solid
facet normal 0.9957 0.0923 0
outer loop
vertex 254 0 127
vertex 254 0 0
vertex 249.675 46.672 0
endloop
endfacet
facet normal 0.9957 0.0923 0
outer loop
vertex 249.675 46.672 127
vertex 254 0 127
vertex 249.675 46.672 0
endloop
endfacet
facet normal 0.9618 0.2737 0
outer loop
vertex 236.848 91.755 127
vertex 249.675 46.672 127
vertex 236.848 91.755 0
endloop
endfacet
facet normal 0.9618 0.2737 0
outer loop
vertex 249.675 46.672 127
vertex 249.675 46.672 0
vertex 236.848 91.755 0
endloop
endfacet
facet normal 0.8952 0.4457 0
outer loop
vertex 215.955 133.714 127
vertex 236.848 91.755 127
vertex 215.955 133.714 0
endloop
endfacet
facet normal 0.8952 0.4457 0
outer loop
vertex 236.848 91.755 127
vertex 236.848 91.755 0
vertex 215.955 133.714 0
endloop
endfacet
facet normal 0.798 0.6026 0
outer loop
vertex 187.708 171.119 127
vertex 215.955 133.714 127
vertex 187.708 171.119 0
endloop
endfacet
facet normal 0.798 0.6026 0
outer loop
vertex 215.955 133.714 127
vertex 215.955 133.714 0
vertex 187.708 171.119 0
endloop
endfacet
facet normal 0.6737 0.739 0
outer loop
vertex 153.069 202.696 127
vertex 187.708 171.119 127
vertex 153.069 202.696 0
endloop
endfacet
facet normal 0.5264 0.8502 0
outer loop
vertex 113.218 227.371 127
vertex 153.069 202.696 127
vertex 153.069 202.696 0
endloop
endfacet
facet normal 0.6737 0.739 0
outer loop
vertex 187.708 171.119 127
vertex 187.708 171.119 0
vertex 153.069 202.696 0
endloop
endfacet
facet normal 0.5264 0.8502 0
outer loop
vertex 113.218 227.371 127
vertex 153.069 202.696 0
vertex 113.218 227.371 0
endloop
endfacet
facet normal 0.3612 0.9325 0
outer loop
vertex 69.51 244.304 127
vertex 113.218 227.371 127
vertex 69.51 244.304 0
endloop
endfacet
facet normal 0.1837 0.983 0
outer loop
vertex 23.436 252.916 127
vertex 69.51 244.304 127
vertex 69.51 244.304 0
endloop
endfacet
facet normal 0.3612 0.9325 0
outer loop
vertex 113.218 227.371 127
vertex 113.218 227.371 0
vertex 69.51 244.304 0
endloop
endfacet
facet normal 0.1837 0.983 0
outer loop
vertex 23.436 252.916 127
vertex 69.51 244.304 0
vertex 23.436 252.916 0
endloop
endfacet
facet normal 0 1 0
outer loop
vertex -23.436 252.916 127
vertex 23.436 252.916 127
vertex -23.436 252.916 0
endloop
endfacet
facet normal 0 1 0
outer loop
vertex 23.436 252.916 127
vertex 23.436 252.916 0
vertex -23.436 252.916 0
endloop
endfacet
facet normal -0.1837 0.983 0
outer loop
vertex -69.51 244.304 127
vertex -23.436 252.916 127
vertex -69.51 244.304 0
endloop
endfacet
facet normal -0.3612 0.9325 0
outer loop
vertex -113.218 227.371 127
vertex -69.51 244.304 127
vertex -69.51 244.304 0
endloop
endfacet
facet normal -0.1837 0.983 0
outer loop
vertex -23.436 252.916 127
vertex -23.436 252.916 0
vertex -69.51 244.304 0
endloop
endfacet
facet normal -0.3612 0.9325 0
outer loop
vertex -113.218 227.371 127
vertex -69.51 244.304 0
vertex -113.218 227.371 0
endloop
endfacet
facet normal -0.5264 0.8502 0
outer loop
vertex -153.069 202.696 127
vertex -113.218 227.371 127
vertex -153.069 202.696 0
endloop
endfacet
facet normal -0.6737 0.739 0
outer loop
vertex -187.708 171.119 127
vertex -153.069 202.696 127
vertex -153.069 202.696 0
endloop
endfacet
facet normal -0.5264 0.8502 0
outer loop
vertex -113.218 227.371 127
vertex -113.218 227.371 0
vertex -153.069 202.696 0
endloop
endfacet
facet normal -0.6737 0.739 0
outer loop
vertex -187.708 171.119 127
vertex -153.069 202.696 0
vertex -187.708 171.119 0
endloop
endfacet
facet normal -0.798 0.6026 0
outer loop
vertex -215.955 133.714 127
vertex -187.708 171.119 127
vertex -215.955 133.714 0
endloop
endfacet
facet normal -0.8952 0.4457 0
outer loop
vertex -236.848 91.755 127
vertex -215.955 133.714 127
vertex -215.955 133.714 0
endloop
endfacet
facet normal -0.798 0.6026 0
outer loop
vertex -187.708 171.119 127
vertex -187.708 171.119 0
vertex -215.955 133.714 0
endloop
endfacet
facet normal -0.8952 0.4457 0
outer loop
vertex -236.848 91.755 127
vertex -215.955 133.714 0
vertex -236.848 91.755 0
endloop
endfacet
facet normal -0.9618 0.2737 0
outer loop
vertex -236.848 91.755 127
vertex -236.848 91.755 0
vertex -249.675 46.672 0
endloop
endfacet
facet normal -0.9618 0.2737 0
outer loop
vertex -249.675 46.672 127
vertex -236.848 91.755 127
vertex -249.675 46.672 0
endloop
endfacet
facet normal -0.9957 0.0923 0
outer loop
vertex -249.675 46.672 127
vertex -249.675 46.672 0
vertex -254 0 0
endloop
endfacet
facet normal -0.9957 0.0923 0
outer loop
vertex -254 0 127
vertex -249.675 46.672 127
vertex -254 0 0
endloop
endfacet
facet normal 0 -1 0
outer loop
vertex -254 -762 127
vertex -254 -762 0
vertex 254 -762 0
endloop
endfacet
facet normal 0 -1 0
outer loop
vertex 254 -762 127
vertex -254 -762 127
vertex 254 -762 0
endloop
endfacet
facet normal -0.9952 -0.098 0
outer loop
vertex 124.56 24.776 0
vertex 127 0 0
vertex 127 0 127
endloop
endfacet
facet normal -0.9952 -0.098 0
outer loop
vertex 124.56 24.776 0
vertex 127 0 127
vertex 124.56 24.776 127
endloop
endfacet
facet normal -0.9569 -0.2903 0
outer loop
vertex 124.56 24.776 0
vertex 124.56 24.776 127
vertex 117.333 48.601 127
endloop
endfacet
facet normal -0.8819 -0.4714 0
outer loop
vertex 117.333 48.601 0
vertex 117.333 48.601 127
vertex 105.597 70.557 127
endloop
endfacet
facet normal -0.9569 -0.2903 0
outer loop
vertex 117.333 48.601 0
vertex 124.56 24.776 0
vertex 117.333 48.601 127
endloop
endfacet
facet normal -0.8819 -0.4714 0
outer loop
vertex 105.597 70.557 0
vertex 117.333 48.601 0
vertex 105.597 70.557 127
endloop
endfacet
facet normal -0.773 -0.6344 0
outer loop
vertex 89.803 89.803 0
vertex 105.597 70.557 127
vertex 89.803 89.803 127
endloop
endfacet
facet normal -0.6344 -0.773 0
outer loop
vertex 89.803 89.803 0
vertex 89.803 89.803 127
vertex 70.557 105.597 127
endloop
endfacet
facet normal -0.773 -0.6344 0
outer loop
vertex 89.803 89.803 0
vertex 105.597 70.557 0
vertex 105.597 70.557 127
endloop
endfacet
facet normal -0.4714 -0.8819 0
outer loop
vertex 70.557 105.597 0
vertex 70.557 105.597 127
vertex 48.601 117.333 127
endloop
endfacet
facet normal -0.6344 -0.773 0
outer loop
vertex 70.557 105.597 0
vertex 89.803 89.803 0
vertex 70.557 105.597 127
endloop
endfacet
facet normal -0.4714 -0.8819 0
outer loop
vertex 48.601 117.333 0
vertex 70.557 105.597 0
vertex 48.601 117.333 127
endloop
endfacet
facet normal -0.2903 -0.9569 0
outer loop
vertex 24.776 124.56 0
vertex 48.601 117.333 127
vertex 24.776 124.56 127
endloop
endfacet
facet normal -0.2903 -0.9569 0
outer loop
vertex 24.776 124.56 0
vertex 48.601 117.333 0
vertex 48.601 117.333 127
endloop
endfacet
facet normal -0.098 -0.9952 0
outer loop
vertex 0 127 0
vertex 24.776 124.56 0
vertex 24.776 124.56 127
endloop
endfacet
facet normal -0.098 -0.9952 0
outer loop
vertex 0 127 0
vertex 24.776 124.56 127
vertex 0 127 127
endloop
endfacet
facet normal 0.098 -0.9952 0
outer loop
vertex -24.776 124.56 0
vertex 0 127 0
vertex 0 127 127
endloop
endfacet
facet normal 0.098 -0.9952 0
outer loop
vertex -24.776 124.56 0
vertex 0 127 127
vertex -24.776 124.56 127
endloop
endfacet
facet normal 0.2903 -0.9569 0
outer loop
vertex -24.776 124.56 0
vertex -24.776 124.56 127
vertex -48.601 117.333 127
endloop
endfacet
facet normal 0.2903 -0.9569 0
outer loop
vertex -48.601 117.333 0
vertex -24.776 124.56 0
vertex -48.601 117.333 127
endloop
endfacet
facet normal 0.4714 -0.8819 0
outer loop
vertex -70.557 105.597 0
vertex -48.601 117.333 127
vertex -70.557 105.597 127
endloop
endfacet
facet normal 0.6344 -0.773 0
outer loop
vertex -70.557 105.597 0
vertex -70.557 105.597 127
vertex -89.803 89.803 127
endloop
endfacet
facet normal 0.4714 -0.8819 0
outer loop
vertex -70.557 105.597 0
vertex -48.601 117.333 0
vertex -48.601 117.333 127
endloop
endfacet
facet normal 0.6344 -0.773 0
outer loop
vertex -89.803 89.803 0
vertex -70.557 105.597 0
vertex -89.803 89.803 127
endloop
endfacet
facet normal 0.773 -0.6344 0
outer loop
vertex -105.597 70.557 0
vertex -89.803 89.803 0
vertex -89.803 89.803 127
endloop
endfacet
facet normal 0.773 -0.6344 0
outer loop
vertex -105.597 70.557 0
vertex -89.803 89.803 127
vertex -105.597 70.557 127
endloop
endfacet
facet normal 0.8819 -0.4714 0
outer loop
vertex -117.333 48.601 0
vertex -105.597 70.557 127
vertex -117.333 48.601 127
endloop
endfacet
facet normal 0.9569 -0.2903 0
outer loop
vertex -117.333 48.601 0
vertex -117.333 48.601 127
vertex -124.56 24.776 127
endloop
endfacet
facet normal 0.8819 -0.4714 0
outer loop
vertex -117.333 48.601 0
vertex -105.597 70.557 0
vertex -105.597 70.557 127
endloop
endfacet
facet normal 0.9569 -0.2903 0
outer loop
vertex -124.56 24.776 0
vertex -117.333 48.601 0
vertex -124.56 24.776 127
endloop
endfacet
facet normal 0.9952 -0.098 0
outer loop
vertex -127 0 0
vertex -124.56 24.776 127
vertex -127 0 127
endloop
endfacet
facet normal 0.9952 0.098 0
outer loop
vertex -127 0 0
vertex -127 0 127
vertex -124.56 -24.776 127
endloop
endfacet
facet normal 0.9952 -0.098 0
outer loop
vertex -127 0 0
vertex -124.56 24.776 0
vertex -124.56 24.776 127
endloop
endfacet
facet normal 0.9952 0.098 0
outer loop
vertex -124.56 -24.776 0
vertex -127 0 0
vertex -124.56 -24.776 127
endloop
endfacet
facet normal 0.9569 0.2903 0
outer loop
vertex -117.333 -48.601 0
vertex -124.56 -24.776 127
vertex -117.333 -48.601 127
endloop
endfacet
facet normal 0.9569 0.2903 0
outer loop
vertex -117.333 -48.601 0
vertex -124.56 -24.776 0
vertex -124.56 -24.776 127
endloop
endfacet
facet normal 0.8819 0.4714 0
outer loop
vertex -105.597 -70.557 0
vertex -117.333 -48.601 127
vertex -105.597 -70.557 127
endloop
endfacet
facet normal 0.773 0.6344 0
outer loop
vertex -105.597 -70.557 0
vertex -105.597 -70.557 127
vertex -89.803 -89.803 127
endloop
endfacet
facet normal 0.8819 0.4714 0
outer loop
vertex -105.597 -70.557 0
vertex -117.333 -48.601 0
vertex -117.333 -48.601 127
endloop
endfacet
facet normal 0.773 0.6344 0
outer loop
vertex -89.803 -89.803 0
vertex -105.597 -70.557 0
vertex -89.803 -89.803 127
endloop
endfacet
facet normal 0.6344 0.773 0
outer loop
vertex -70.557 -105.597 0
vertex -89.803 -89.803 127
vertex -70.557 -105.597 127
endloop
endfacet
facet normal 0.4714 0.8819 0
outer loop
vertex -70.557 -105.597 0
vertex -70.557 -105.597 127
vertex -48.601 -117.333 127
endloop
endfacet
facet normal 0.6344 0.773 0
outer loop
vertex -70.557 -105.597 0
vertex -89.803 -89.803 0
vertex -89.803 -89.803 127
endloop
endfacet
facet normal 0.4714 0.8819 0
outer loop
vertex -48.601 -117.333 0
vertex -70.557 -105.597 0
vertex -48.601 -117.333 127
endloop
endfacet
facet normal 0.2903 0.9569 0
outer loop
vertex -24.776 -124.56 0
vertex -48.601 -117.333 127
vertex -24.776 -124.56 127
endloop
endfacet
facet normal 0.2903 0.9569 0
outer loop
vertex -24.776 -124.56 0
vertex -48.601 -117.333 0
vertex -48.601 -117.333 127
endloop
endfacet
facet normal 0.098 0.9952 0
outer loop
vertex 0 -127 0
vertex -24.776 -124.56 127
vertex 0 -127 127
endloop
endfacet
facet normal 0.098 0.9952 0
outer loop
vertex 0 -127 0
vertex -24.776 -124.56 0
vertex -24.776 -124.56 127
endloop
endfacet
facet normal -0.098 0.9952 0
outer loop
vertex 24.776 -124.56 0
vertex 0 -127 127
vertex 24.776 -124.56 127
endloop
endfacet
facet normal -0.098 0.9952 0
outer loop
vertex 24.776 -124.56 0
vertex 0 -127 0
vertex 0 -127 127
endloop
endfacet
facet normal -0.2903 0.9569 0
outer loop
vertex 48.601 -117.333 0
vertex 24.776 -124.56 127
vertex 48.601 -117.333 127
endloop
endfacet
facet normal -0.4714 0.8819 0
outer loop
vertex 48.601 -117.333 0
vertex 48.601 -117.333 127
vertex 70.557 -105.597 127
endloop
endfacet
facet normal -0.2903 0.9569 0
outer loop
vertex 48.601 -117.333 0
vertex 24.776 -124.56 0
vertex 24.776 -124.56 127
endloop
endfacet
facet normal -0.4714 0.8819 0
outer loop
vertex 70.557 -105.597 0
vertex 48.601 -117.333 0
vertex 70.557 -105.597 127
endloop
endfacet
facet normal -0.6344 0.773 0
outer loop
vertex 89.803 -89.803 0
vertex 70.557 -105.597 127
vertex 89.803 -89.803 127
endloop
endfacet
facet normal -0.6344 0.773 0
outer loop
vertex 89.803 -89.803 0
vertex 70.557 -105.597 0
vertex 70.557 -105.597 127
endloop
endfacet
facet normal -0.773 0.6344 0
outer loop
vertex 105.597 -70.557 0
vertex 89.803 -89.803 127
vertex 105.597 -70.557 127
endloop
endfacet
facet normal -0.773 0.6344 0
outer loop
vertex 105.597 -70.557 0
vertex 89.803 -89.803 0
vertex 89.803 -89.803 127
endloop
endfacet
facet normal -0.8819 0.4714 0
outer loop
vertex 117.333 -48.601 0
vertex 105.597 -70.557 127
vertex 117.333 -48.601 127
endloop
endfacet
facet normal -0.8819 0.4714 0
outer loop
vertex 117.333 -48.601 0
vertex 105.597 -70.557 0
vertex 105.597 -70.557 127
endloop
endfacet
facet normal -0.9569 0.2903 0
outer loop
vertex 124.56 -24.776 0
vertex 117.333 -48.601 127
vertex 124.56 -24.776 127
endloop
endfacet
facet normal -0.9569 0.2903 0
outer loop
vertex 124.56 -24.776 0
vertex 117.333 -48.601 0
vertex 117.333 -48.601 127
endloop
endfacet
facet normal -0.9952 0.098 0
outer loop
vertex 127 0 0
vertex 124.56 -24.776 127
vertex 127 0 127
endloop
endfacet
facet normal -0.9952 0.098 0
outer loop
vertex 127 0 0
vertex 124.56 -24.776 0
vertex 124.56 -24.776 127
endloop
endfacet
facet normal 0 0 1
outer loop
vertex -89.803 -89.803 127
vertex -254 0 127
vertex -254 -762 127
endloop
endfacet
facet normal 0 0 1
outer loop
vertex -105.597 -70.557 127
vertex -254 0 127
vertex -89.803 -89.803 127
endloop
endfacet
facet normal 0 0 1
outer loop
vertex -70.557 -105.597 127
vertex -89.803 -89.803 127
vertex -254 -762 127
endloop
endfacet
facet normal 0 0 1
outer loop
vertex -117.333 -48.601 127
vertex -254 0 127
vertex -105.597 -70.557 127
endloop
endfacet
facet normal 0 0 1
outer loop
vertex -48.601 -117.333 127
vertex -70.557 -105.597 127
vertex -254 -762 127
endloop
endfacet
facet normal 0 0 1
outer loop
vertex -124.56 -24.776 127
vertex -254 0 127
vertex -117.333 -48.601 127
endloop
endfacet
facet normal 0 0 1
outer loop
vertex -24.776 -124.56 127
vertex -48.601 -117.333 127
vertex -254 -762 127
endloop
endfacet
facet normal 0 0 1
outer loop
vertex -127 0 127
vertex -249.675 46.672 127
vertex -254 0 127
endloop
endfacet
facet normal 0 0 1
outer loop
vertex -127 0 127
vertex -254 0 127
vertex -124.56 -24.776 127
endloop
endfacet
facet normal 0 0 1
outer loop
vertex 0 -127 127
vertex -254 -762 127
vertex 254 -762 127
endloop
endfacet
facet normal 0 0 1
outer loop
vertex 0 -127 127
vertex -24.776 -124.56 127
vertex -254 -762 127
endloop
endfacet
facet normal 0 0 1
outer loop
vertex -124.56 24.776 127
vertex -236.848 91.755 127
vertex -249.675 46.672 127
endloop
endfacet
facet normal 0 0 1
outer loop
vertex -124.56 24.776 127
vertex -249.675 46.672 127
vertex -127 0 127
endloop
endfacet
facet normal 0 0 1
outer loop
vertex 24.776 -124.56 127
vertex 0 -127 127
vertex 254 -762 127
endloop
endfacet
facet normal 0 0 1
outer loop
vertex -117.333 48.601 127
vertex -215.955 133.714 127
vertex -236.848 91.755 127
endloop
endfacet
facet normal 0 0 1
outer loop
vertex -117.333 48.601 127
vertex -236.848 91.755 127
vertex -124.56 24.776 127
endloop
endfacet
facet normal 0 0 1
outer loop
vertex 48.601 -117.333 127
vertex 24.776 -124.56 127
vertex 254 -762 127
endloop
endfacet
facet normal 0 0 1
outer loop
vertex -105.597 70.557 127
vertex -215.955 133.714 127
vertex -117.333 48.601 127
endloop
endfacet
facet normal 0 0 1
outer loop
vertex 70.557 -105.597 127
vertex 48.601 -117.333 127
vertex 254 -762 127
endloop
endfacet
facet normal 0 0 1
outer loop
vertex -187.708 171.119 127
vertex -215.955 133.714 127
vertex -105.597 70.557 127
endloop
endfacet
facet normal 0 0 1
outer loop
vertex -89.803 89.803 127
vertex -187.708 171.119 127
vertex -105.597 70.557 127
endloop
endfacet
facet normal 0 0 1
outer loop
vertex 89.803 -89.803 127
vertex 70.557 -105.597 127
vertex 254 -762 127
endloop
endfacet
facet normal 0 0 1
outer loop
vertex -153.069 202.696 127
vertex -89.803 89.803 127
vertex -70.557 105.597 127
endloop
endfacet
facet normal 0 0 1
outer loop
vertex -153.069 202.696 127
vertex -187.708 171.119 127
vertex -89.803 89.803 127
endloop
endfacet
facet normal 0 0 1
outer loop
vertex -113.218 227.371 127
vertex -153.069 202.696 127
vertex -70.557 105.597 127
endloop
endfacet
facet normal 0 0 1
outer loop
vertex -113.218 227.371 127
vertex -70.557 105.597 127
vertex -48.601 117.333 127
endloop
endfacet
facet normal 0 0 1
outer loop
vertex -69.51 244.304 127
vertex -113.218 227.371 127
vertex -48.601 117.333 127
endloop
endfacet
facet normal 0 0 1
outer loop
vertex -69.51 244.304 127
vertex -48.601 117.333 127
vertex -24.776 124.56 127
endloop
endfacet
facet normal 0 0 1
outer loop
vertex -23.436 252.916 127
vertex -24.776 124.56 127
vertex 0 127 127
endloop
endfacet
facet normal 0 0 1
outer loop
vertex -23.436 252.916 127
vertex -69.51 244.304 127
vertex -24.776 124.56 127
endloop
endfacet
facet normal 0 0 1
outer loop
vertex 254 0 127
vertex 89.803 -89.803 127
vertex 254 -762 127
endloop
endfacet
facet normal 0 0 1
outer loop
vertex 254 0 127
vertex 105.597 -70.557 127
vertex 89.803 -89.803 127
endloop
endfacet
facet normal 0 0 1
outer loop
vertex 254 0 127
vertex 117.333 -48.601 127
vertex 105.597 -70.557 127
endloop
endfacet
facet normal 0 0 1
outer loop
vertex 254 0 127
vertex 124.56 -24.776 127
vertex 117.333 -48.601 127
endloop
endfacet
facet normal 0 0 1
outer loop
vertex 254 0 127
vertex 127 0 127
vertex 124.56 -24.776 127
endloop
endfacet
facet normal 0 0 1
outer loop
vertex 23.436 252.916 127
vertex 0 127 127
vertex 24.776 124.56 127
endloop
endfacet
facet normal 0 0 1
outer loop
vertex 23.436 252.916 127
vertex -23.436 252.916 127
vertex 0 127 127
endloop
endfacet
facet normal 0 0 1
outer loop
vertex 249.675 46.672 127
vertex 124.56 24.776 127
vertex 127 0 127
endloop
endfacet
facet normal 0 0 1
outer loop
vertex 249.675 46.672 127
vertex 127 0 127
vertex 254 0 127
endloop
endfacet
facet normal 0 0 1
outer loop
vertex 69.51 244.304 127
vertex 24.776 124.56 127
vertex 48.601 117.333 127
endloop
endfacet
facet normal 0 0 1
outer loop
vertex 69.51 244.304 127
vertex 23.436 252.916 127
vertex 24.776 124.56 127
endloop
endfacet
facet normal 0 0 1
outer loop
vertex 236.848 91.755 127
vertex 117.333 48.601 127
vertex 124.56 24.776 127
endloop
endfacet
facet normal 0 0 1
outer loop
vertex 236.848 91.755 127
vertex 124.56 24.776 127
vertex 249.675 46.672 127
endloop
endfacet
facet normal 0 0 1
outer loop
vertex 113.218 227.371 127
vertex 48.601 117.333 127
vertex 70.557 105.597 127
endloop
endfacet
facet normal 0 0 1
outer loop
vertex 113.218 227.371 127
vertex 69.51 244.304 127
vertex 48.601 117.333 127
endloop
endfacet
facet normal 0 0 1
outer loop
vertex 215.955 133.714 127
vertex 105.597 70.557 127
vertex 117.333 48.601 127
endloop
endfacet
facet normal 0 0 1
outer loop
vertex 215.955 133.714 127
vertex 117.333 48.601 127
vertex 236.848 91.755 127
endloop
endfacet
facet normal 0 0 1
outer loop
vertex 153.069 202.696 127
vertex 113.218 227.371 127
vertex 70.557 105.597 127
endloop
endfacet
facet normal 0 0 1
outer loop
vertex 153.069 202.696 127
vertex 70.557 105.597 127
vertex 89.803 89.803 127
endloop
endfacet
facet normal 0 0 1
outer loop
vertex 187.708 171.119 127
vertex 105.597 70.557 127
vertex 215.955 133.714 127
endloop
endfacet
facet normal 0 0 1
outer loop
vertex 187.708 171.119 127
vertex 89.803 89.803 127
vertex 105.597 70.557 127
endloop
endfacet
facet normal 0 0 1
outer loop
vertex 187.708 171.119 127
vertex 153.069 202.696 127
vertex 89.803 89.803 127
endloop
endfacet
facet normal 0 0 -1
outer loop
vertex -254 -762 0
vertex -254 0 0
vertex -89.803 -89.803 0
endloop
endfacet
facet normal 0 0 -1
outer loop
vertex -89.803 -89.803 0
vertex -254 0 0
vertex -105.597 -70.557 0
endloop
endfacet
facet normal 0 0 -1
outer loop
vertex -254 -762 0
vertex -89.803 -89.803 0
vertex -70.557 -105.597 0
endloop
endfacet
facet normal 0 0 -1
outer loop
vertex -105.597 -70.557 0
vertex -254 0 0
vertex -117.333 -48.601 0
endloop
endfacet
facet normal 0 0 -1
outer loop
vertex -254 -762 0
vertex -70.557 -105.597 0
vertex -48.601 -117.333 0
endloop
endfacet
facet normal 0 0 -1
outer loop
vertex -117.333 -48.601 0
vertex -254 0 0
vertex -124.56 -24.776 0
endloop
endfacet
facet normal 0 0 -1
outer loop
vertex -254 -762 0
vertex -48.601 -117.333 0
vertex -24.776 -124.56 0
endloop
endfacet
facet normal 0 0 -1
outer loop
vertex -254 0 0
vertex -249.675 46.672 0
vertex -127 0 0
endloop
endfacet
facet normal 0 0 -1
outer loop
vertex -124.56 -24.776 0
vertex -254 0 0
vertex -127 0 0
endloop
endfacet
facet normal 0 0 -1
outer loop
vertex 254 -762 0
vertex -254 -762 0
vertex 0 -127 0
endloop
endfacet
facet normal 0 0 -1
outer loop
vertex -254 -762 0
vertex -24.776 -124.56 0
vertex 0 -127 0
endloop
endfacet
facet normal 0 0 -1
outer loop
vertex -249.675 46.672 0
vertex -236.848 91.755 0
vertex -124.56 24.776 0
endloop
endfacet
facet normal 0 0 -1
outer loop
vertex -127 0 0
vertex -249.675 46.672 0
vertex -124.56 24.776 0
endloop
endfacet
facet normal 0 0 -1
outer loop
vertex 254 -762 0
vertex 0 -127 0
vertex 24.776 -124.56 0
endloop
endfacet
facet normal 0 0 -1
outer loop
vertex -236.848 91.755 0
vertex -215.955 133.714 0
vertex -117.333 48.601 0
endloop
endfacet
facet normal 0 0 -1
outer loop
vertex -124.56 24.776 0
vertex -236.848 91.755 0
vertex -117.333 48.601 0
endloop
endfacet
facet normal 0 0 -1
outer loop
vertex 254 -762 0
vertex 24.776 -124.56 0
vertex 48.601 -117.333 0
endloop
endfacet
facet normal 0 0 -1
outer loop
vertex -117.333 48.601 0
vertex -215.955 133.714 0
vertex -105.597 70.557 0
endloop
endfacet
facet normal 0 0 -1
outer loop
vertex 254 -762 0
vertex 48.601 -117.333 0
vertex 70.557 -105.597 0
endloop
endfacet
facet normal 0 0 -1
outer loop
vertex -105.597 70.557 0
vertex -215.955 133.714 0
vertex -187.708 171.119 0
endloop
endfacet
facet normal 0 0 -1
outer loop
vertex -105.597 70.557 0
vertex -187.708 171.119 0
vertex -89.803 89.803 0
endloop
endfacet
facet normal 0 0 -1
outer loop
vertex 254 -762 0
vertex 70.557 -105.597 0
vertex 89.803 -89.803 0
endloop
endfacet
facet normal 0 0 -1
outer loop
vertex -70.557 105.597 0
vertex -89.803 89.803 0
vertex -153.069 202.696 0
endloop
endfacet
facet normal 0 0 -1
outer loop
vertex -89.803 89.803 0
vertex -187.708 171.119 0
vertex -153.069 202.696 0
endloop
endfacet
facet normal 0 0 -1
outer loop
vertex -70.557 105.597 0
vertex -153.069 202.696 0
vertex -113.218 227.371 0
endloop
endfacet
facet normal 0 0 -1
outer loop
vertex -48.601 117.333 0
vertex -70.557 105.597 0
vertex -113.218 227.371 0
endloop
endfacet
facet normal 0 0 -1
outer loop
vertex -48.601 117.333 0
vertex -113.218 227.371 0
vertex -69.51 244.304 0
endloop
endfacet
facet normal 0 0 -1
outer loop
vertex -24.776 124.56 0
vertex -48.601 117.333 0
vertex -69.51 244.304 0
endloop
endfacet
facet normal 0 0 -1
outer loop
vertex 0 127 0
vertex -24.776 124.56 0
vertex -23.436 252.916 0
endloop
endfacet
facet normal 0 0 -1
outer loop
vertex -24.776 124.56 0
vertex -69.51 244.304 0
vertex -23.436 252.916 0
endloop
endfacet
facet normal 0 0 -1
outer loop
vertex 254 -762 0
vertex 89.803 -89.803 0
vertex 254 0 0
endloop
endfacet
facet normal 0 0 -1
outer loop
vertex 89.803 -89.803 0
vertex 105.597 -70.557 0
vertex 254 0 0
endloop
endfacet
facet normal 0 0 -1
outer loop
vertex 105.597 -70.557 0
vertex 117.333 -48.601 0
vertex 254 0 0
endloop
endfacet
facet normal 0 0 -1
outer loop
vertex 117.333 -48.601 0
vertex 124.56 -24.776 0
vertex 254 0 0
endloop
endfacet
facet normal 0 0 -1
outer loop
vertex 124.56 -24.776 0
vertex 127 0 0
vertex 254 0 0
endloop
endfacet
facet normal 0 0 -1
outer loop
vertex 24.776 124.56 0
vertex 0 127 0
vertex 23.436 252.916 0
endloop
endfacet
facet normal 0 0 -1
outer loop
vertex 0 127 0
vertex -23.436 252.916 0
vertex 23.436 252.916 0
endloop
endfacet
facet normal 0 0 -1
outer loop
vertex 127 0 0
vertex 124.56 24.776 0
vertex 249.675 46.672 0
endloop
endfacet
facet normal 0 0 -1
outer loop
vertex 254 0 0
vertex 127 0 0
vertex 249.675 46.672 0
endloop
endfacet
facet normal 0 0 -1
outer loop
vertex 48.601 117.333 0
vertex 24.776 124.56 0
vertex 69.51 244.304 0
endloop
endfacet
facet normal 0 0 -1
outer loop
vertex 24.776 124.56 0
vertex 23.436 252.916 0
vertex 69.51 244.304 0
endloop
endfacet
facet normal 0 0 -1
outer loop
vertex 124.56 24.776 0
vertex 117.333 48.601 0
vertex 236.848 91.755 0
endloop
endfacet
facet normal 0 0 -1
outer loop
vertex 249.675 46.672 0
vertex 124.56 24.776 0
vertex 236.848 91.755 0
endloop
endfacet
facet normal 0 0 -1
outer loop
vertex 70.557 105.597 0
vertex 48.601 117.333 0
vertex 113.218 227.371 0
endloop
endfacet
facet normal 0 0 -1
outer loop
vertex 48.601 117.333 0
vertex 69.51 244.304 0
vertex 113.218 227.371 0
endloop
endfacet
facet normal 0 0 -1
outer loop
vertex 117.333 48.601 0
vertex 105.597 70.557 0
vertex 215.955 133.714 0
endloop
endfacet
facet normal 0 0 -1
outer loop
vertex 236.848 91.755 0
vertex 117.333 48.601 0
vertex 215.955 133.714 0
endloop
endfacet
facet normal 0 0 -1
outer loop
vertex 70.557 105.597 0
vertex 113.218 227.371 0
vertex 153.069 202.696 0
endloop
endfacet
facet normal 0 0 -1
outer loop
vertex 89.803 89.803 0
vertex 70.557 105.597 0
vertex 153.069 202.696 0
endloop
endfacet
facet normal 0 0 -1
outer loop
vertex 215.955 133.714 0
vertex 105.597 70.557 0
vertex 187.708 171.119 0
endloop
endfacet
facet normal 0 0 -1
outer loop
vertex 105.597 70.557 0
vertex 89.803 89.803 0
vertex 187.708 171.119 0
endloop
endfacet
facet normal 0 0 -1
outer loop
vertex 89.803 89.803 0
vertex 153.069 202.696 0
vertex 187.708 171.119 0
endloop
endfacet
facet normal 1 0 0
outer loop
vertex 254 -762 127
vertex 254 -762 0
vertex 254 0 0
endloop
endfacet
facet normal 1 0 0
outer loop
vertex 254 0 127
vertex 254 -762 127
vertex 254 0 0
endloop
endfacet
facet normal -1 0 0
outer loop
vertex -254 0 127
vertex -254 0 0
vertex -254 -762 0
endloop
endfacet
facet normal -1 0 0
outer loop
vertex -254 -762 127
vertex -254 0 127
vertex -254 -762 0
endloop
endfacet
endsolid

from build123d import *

# Parameters (mm, degrees)
F0_R     = 127
F1_DEPTH = 127


with BuildPart() as f1:
    # F0 (on Top) → F1 (new body)
    with BuildSketch(Plane.XY):
        with BuildLine():
            Line((-254, 0), (-254, -762))
            Line((-254, -762), (254, -762))
            Line((254, -762), (254, 0))
            ThreePointArc((254, 0), (0, 254), (-254, 0))
        make_face()
        Circle(F0_R, mode=Mode.SUBTRACT)
    extrude(amount=F1_DEPTH)


solid = f1.part
